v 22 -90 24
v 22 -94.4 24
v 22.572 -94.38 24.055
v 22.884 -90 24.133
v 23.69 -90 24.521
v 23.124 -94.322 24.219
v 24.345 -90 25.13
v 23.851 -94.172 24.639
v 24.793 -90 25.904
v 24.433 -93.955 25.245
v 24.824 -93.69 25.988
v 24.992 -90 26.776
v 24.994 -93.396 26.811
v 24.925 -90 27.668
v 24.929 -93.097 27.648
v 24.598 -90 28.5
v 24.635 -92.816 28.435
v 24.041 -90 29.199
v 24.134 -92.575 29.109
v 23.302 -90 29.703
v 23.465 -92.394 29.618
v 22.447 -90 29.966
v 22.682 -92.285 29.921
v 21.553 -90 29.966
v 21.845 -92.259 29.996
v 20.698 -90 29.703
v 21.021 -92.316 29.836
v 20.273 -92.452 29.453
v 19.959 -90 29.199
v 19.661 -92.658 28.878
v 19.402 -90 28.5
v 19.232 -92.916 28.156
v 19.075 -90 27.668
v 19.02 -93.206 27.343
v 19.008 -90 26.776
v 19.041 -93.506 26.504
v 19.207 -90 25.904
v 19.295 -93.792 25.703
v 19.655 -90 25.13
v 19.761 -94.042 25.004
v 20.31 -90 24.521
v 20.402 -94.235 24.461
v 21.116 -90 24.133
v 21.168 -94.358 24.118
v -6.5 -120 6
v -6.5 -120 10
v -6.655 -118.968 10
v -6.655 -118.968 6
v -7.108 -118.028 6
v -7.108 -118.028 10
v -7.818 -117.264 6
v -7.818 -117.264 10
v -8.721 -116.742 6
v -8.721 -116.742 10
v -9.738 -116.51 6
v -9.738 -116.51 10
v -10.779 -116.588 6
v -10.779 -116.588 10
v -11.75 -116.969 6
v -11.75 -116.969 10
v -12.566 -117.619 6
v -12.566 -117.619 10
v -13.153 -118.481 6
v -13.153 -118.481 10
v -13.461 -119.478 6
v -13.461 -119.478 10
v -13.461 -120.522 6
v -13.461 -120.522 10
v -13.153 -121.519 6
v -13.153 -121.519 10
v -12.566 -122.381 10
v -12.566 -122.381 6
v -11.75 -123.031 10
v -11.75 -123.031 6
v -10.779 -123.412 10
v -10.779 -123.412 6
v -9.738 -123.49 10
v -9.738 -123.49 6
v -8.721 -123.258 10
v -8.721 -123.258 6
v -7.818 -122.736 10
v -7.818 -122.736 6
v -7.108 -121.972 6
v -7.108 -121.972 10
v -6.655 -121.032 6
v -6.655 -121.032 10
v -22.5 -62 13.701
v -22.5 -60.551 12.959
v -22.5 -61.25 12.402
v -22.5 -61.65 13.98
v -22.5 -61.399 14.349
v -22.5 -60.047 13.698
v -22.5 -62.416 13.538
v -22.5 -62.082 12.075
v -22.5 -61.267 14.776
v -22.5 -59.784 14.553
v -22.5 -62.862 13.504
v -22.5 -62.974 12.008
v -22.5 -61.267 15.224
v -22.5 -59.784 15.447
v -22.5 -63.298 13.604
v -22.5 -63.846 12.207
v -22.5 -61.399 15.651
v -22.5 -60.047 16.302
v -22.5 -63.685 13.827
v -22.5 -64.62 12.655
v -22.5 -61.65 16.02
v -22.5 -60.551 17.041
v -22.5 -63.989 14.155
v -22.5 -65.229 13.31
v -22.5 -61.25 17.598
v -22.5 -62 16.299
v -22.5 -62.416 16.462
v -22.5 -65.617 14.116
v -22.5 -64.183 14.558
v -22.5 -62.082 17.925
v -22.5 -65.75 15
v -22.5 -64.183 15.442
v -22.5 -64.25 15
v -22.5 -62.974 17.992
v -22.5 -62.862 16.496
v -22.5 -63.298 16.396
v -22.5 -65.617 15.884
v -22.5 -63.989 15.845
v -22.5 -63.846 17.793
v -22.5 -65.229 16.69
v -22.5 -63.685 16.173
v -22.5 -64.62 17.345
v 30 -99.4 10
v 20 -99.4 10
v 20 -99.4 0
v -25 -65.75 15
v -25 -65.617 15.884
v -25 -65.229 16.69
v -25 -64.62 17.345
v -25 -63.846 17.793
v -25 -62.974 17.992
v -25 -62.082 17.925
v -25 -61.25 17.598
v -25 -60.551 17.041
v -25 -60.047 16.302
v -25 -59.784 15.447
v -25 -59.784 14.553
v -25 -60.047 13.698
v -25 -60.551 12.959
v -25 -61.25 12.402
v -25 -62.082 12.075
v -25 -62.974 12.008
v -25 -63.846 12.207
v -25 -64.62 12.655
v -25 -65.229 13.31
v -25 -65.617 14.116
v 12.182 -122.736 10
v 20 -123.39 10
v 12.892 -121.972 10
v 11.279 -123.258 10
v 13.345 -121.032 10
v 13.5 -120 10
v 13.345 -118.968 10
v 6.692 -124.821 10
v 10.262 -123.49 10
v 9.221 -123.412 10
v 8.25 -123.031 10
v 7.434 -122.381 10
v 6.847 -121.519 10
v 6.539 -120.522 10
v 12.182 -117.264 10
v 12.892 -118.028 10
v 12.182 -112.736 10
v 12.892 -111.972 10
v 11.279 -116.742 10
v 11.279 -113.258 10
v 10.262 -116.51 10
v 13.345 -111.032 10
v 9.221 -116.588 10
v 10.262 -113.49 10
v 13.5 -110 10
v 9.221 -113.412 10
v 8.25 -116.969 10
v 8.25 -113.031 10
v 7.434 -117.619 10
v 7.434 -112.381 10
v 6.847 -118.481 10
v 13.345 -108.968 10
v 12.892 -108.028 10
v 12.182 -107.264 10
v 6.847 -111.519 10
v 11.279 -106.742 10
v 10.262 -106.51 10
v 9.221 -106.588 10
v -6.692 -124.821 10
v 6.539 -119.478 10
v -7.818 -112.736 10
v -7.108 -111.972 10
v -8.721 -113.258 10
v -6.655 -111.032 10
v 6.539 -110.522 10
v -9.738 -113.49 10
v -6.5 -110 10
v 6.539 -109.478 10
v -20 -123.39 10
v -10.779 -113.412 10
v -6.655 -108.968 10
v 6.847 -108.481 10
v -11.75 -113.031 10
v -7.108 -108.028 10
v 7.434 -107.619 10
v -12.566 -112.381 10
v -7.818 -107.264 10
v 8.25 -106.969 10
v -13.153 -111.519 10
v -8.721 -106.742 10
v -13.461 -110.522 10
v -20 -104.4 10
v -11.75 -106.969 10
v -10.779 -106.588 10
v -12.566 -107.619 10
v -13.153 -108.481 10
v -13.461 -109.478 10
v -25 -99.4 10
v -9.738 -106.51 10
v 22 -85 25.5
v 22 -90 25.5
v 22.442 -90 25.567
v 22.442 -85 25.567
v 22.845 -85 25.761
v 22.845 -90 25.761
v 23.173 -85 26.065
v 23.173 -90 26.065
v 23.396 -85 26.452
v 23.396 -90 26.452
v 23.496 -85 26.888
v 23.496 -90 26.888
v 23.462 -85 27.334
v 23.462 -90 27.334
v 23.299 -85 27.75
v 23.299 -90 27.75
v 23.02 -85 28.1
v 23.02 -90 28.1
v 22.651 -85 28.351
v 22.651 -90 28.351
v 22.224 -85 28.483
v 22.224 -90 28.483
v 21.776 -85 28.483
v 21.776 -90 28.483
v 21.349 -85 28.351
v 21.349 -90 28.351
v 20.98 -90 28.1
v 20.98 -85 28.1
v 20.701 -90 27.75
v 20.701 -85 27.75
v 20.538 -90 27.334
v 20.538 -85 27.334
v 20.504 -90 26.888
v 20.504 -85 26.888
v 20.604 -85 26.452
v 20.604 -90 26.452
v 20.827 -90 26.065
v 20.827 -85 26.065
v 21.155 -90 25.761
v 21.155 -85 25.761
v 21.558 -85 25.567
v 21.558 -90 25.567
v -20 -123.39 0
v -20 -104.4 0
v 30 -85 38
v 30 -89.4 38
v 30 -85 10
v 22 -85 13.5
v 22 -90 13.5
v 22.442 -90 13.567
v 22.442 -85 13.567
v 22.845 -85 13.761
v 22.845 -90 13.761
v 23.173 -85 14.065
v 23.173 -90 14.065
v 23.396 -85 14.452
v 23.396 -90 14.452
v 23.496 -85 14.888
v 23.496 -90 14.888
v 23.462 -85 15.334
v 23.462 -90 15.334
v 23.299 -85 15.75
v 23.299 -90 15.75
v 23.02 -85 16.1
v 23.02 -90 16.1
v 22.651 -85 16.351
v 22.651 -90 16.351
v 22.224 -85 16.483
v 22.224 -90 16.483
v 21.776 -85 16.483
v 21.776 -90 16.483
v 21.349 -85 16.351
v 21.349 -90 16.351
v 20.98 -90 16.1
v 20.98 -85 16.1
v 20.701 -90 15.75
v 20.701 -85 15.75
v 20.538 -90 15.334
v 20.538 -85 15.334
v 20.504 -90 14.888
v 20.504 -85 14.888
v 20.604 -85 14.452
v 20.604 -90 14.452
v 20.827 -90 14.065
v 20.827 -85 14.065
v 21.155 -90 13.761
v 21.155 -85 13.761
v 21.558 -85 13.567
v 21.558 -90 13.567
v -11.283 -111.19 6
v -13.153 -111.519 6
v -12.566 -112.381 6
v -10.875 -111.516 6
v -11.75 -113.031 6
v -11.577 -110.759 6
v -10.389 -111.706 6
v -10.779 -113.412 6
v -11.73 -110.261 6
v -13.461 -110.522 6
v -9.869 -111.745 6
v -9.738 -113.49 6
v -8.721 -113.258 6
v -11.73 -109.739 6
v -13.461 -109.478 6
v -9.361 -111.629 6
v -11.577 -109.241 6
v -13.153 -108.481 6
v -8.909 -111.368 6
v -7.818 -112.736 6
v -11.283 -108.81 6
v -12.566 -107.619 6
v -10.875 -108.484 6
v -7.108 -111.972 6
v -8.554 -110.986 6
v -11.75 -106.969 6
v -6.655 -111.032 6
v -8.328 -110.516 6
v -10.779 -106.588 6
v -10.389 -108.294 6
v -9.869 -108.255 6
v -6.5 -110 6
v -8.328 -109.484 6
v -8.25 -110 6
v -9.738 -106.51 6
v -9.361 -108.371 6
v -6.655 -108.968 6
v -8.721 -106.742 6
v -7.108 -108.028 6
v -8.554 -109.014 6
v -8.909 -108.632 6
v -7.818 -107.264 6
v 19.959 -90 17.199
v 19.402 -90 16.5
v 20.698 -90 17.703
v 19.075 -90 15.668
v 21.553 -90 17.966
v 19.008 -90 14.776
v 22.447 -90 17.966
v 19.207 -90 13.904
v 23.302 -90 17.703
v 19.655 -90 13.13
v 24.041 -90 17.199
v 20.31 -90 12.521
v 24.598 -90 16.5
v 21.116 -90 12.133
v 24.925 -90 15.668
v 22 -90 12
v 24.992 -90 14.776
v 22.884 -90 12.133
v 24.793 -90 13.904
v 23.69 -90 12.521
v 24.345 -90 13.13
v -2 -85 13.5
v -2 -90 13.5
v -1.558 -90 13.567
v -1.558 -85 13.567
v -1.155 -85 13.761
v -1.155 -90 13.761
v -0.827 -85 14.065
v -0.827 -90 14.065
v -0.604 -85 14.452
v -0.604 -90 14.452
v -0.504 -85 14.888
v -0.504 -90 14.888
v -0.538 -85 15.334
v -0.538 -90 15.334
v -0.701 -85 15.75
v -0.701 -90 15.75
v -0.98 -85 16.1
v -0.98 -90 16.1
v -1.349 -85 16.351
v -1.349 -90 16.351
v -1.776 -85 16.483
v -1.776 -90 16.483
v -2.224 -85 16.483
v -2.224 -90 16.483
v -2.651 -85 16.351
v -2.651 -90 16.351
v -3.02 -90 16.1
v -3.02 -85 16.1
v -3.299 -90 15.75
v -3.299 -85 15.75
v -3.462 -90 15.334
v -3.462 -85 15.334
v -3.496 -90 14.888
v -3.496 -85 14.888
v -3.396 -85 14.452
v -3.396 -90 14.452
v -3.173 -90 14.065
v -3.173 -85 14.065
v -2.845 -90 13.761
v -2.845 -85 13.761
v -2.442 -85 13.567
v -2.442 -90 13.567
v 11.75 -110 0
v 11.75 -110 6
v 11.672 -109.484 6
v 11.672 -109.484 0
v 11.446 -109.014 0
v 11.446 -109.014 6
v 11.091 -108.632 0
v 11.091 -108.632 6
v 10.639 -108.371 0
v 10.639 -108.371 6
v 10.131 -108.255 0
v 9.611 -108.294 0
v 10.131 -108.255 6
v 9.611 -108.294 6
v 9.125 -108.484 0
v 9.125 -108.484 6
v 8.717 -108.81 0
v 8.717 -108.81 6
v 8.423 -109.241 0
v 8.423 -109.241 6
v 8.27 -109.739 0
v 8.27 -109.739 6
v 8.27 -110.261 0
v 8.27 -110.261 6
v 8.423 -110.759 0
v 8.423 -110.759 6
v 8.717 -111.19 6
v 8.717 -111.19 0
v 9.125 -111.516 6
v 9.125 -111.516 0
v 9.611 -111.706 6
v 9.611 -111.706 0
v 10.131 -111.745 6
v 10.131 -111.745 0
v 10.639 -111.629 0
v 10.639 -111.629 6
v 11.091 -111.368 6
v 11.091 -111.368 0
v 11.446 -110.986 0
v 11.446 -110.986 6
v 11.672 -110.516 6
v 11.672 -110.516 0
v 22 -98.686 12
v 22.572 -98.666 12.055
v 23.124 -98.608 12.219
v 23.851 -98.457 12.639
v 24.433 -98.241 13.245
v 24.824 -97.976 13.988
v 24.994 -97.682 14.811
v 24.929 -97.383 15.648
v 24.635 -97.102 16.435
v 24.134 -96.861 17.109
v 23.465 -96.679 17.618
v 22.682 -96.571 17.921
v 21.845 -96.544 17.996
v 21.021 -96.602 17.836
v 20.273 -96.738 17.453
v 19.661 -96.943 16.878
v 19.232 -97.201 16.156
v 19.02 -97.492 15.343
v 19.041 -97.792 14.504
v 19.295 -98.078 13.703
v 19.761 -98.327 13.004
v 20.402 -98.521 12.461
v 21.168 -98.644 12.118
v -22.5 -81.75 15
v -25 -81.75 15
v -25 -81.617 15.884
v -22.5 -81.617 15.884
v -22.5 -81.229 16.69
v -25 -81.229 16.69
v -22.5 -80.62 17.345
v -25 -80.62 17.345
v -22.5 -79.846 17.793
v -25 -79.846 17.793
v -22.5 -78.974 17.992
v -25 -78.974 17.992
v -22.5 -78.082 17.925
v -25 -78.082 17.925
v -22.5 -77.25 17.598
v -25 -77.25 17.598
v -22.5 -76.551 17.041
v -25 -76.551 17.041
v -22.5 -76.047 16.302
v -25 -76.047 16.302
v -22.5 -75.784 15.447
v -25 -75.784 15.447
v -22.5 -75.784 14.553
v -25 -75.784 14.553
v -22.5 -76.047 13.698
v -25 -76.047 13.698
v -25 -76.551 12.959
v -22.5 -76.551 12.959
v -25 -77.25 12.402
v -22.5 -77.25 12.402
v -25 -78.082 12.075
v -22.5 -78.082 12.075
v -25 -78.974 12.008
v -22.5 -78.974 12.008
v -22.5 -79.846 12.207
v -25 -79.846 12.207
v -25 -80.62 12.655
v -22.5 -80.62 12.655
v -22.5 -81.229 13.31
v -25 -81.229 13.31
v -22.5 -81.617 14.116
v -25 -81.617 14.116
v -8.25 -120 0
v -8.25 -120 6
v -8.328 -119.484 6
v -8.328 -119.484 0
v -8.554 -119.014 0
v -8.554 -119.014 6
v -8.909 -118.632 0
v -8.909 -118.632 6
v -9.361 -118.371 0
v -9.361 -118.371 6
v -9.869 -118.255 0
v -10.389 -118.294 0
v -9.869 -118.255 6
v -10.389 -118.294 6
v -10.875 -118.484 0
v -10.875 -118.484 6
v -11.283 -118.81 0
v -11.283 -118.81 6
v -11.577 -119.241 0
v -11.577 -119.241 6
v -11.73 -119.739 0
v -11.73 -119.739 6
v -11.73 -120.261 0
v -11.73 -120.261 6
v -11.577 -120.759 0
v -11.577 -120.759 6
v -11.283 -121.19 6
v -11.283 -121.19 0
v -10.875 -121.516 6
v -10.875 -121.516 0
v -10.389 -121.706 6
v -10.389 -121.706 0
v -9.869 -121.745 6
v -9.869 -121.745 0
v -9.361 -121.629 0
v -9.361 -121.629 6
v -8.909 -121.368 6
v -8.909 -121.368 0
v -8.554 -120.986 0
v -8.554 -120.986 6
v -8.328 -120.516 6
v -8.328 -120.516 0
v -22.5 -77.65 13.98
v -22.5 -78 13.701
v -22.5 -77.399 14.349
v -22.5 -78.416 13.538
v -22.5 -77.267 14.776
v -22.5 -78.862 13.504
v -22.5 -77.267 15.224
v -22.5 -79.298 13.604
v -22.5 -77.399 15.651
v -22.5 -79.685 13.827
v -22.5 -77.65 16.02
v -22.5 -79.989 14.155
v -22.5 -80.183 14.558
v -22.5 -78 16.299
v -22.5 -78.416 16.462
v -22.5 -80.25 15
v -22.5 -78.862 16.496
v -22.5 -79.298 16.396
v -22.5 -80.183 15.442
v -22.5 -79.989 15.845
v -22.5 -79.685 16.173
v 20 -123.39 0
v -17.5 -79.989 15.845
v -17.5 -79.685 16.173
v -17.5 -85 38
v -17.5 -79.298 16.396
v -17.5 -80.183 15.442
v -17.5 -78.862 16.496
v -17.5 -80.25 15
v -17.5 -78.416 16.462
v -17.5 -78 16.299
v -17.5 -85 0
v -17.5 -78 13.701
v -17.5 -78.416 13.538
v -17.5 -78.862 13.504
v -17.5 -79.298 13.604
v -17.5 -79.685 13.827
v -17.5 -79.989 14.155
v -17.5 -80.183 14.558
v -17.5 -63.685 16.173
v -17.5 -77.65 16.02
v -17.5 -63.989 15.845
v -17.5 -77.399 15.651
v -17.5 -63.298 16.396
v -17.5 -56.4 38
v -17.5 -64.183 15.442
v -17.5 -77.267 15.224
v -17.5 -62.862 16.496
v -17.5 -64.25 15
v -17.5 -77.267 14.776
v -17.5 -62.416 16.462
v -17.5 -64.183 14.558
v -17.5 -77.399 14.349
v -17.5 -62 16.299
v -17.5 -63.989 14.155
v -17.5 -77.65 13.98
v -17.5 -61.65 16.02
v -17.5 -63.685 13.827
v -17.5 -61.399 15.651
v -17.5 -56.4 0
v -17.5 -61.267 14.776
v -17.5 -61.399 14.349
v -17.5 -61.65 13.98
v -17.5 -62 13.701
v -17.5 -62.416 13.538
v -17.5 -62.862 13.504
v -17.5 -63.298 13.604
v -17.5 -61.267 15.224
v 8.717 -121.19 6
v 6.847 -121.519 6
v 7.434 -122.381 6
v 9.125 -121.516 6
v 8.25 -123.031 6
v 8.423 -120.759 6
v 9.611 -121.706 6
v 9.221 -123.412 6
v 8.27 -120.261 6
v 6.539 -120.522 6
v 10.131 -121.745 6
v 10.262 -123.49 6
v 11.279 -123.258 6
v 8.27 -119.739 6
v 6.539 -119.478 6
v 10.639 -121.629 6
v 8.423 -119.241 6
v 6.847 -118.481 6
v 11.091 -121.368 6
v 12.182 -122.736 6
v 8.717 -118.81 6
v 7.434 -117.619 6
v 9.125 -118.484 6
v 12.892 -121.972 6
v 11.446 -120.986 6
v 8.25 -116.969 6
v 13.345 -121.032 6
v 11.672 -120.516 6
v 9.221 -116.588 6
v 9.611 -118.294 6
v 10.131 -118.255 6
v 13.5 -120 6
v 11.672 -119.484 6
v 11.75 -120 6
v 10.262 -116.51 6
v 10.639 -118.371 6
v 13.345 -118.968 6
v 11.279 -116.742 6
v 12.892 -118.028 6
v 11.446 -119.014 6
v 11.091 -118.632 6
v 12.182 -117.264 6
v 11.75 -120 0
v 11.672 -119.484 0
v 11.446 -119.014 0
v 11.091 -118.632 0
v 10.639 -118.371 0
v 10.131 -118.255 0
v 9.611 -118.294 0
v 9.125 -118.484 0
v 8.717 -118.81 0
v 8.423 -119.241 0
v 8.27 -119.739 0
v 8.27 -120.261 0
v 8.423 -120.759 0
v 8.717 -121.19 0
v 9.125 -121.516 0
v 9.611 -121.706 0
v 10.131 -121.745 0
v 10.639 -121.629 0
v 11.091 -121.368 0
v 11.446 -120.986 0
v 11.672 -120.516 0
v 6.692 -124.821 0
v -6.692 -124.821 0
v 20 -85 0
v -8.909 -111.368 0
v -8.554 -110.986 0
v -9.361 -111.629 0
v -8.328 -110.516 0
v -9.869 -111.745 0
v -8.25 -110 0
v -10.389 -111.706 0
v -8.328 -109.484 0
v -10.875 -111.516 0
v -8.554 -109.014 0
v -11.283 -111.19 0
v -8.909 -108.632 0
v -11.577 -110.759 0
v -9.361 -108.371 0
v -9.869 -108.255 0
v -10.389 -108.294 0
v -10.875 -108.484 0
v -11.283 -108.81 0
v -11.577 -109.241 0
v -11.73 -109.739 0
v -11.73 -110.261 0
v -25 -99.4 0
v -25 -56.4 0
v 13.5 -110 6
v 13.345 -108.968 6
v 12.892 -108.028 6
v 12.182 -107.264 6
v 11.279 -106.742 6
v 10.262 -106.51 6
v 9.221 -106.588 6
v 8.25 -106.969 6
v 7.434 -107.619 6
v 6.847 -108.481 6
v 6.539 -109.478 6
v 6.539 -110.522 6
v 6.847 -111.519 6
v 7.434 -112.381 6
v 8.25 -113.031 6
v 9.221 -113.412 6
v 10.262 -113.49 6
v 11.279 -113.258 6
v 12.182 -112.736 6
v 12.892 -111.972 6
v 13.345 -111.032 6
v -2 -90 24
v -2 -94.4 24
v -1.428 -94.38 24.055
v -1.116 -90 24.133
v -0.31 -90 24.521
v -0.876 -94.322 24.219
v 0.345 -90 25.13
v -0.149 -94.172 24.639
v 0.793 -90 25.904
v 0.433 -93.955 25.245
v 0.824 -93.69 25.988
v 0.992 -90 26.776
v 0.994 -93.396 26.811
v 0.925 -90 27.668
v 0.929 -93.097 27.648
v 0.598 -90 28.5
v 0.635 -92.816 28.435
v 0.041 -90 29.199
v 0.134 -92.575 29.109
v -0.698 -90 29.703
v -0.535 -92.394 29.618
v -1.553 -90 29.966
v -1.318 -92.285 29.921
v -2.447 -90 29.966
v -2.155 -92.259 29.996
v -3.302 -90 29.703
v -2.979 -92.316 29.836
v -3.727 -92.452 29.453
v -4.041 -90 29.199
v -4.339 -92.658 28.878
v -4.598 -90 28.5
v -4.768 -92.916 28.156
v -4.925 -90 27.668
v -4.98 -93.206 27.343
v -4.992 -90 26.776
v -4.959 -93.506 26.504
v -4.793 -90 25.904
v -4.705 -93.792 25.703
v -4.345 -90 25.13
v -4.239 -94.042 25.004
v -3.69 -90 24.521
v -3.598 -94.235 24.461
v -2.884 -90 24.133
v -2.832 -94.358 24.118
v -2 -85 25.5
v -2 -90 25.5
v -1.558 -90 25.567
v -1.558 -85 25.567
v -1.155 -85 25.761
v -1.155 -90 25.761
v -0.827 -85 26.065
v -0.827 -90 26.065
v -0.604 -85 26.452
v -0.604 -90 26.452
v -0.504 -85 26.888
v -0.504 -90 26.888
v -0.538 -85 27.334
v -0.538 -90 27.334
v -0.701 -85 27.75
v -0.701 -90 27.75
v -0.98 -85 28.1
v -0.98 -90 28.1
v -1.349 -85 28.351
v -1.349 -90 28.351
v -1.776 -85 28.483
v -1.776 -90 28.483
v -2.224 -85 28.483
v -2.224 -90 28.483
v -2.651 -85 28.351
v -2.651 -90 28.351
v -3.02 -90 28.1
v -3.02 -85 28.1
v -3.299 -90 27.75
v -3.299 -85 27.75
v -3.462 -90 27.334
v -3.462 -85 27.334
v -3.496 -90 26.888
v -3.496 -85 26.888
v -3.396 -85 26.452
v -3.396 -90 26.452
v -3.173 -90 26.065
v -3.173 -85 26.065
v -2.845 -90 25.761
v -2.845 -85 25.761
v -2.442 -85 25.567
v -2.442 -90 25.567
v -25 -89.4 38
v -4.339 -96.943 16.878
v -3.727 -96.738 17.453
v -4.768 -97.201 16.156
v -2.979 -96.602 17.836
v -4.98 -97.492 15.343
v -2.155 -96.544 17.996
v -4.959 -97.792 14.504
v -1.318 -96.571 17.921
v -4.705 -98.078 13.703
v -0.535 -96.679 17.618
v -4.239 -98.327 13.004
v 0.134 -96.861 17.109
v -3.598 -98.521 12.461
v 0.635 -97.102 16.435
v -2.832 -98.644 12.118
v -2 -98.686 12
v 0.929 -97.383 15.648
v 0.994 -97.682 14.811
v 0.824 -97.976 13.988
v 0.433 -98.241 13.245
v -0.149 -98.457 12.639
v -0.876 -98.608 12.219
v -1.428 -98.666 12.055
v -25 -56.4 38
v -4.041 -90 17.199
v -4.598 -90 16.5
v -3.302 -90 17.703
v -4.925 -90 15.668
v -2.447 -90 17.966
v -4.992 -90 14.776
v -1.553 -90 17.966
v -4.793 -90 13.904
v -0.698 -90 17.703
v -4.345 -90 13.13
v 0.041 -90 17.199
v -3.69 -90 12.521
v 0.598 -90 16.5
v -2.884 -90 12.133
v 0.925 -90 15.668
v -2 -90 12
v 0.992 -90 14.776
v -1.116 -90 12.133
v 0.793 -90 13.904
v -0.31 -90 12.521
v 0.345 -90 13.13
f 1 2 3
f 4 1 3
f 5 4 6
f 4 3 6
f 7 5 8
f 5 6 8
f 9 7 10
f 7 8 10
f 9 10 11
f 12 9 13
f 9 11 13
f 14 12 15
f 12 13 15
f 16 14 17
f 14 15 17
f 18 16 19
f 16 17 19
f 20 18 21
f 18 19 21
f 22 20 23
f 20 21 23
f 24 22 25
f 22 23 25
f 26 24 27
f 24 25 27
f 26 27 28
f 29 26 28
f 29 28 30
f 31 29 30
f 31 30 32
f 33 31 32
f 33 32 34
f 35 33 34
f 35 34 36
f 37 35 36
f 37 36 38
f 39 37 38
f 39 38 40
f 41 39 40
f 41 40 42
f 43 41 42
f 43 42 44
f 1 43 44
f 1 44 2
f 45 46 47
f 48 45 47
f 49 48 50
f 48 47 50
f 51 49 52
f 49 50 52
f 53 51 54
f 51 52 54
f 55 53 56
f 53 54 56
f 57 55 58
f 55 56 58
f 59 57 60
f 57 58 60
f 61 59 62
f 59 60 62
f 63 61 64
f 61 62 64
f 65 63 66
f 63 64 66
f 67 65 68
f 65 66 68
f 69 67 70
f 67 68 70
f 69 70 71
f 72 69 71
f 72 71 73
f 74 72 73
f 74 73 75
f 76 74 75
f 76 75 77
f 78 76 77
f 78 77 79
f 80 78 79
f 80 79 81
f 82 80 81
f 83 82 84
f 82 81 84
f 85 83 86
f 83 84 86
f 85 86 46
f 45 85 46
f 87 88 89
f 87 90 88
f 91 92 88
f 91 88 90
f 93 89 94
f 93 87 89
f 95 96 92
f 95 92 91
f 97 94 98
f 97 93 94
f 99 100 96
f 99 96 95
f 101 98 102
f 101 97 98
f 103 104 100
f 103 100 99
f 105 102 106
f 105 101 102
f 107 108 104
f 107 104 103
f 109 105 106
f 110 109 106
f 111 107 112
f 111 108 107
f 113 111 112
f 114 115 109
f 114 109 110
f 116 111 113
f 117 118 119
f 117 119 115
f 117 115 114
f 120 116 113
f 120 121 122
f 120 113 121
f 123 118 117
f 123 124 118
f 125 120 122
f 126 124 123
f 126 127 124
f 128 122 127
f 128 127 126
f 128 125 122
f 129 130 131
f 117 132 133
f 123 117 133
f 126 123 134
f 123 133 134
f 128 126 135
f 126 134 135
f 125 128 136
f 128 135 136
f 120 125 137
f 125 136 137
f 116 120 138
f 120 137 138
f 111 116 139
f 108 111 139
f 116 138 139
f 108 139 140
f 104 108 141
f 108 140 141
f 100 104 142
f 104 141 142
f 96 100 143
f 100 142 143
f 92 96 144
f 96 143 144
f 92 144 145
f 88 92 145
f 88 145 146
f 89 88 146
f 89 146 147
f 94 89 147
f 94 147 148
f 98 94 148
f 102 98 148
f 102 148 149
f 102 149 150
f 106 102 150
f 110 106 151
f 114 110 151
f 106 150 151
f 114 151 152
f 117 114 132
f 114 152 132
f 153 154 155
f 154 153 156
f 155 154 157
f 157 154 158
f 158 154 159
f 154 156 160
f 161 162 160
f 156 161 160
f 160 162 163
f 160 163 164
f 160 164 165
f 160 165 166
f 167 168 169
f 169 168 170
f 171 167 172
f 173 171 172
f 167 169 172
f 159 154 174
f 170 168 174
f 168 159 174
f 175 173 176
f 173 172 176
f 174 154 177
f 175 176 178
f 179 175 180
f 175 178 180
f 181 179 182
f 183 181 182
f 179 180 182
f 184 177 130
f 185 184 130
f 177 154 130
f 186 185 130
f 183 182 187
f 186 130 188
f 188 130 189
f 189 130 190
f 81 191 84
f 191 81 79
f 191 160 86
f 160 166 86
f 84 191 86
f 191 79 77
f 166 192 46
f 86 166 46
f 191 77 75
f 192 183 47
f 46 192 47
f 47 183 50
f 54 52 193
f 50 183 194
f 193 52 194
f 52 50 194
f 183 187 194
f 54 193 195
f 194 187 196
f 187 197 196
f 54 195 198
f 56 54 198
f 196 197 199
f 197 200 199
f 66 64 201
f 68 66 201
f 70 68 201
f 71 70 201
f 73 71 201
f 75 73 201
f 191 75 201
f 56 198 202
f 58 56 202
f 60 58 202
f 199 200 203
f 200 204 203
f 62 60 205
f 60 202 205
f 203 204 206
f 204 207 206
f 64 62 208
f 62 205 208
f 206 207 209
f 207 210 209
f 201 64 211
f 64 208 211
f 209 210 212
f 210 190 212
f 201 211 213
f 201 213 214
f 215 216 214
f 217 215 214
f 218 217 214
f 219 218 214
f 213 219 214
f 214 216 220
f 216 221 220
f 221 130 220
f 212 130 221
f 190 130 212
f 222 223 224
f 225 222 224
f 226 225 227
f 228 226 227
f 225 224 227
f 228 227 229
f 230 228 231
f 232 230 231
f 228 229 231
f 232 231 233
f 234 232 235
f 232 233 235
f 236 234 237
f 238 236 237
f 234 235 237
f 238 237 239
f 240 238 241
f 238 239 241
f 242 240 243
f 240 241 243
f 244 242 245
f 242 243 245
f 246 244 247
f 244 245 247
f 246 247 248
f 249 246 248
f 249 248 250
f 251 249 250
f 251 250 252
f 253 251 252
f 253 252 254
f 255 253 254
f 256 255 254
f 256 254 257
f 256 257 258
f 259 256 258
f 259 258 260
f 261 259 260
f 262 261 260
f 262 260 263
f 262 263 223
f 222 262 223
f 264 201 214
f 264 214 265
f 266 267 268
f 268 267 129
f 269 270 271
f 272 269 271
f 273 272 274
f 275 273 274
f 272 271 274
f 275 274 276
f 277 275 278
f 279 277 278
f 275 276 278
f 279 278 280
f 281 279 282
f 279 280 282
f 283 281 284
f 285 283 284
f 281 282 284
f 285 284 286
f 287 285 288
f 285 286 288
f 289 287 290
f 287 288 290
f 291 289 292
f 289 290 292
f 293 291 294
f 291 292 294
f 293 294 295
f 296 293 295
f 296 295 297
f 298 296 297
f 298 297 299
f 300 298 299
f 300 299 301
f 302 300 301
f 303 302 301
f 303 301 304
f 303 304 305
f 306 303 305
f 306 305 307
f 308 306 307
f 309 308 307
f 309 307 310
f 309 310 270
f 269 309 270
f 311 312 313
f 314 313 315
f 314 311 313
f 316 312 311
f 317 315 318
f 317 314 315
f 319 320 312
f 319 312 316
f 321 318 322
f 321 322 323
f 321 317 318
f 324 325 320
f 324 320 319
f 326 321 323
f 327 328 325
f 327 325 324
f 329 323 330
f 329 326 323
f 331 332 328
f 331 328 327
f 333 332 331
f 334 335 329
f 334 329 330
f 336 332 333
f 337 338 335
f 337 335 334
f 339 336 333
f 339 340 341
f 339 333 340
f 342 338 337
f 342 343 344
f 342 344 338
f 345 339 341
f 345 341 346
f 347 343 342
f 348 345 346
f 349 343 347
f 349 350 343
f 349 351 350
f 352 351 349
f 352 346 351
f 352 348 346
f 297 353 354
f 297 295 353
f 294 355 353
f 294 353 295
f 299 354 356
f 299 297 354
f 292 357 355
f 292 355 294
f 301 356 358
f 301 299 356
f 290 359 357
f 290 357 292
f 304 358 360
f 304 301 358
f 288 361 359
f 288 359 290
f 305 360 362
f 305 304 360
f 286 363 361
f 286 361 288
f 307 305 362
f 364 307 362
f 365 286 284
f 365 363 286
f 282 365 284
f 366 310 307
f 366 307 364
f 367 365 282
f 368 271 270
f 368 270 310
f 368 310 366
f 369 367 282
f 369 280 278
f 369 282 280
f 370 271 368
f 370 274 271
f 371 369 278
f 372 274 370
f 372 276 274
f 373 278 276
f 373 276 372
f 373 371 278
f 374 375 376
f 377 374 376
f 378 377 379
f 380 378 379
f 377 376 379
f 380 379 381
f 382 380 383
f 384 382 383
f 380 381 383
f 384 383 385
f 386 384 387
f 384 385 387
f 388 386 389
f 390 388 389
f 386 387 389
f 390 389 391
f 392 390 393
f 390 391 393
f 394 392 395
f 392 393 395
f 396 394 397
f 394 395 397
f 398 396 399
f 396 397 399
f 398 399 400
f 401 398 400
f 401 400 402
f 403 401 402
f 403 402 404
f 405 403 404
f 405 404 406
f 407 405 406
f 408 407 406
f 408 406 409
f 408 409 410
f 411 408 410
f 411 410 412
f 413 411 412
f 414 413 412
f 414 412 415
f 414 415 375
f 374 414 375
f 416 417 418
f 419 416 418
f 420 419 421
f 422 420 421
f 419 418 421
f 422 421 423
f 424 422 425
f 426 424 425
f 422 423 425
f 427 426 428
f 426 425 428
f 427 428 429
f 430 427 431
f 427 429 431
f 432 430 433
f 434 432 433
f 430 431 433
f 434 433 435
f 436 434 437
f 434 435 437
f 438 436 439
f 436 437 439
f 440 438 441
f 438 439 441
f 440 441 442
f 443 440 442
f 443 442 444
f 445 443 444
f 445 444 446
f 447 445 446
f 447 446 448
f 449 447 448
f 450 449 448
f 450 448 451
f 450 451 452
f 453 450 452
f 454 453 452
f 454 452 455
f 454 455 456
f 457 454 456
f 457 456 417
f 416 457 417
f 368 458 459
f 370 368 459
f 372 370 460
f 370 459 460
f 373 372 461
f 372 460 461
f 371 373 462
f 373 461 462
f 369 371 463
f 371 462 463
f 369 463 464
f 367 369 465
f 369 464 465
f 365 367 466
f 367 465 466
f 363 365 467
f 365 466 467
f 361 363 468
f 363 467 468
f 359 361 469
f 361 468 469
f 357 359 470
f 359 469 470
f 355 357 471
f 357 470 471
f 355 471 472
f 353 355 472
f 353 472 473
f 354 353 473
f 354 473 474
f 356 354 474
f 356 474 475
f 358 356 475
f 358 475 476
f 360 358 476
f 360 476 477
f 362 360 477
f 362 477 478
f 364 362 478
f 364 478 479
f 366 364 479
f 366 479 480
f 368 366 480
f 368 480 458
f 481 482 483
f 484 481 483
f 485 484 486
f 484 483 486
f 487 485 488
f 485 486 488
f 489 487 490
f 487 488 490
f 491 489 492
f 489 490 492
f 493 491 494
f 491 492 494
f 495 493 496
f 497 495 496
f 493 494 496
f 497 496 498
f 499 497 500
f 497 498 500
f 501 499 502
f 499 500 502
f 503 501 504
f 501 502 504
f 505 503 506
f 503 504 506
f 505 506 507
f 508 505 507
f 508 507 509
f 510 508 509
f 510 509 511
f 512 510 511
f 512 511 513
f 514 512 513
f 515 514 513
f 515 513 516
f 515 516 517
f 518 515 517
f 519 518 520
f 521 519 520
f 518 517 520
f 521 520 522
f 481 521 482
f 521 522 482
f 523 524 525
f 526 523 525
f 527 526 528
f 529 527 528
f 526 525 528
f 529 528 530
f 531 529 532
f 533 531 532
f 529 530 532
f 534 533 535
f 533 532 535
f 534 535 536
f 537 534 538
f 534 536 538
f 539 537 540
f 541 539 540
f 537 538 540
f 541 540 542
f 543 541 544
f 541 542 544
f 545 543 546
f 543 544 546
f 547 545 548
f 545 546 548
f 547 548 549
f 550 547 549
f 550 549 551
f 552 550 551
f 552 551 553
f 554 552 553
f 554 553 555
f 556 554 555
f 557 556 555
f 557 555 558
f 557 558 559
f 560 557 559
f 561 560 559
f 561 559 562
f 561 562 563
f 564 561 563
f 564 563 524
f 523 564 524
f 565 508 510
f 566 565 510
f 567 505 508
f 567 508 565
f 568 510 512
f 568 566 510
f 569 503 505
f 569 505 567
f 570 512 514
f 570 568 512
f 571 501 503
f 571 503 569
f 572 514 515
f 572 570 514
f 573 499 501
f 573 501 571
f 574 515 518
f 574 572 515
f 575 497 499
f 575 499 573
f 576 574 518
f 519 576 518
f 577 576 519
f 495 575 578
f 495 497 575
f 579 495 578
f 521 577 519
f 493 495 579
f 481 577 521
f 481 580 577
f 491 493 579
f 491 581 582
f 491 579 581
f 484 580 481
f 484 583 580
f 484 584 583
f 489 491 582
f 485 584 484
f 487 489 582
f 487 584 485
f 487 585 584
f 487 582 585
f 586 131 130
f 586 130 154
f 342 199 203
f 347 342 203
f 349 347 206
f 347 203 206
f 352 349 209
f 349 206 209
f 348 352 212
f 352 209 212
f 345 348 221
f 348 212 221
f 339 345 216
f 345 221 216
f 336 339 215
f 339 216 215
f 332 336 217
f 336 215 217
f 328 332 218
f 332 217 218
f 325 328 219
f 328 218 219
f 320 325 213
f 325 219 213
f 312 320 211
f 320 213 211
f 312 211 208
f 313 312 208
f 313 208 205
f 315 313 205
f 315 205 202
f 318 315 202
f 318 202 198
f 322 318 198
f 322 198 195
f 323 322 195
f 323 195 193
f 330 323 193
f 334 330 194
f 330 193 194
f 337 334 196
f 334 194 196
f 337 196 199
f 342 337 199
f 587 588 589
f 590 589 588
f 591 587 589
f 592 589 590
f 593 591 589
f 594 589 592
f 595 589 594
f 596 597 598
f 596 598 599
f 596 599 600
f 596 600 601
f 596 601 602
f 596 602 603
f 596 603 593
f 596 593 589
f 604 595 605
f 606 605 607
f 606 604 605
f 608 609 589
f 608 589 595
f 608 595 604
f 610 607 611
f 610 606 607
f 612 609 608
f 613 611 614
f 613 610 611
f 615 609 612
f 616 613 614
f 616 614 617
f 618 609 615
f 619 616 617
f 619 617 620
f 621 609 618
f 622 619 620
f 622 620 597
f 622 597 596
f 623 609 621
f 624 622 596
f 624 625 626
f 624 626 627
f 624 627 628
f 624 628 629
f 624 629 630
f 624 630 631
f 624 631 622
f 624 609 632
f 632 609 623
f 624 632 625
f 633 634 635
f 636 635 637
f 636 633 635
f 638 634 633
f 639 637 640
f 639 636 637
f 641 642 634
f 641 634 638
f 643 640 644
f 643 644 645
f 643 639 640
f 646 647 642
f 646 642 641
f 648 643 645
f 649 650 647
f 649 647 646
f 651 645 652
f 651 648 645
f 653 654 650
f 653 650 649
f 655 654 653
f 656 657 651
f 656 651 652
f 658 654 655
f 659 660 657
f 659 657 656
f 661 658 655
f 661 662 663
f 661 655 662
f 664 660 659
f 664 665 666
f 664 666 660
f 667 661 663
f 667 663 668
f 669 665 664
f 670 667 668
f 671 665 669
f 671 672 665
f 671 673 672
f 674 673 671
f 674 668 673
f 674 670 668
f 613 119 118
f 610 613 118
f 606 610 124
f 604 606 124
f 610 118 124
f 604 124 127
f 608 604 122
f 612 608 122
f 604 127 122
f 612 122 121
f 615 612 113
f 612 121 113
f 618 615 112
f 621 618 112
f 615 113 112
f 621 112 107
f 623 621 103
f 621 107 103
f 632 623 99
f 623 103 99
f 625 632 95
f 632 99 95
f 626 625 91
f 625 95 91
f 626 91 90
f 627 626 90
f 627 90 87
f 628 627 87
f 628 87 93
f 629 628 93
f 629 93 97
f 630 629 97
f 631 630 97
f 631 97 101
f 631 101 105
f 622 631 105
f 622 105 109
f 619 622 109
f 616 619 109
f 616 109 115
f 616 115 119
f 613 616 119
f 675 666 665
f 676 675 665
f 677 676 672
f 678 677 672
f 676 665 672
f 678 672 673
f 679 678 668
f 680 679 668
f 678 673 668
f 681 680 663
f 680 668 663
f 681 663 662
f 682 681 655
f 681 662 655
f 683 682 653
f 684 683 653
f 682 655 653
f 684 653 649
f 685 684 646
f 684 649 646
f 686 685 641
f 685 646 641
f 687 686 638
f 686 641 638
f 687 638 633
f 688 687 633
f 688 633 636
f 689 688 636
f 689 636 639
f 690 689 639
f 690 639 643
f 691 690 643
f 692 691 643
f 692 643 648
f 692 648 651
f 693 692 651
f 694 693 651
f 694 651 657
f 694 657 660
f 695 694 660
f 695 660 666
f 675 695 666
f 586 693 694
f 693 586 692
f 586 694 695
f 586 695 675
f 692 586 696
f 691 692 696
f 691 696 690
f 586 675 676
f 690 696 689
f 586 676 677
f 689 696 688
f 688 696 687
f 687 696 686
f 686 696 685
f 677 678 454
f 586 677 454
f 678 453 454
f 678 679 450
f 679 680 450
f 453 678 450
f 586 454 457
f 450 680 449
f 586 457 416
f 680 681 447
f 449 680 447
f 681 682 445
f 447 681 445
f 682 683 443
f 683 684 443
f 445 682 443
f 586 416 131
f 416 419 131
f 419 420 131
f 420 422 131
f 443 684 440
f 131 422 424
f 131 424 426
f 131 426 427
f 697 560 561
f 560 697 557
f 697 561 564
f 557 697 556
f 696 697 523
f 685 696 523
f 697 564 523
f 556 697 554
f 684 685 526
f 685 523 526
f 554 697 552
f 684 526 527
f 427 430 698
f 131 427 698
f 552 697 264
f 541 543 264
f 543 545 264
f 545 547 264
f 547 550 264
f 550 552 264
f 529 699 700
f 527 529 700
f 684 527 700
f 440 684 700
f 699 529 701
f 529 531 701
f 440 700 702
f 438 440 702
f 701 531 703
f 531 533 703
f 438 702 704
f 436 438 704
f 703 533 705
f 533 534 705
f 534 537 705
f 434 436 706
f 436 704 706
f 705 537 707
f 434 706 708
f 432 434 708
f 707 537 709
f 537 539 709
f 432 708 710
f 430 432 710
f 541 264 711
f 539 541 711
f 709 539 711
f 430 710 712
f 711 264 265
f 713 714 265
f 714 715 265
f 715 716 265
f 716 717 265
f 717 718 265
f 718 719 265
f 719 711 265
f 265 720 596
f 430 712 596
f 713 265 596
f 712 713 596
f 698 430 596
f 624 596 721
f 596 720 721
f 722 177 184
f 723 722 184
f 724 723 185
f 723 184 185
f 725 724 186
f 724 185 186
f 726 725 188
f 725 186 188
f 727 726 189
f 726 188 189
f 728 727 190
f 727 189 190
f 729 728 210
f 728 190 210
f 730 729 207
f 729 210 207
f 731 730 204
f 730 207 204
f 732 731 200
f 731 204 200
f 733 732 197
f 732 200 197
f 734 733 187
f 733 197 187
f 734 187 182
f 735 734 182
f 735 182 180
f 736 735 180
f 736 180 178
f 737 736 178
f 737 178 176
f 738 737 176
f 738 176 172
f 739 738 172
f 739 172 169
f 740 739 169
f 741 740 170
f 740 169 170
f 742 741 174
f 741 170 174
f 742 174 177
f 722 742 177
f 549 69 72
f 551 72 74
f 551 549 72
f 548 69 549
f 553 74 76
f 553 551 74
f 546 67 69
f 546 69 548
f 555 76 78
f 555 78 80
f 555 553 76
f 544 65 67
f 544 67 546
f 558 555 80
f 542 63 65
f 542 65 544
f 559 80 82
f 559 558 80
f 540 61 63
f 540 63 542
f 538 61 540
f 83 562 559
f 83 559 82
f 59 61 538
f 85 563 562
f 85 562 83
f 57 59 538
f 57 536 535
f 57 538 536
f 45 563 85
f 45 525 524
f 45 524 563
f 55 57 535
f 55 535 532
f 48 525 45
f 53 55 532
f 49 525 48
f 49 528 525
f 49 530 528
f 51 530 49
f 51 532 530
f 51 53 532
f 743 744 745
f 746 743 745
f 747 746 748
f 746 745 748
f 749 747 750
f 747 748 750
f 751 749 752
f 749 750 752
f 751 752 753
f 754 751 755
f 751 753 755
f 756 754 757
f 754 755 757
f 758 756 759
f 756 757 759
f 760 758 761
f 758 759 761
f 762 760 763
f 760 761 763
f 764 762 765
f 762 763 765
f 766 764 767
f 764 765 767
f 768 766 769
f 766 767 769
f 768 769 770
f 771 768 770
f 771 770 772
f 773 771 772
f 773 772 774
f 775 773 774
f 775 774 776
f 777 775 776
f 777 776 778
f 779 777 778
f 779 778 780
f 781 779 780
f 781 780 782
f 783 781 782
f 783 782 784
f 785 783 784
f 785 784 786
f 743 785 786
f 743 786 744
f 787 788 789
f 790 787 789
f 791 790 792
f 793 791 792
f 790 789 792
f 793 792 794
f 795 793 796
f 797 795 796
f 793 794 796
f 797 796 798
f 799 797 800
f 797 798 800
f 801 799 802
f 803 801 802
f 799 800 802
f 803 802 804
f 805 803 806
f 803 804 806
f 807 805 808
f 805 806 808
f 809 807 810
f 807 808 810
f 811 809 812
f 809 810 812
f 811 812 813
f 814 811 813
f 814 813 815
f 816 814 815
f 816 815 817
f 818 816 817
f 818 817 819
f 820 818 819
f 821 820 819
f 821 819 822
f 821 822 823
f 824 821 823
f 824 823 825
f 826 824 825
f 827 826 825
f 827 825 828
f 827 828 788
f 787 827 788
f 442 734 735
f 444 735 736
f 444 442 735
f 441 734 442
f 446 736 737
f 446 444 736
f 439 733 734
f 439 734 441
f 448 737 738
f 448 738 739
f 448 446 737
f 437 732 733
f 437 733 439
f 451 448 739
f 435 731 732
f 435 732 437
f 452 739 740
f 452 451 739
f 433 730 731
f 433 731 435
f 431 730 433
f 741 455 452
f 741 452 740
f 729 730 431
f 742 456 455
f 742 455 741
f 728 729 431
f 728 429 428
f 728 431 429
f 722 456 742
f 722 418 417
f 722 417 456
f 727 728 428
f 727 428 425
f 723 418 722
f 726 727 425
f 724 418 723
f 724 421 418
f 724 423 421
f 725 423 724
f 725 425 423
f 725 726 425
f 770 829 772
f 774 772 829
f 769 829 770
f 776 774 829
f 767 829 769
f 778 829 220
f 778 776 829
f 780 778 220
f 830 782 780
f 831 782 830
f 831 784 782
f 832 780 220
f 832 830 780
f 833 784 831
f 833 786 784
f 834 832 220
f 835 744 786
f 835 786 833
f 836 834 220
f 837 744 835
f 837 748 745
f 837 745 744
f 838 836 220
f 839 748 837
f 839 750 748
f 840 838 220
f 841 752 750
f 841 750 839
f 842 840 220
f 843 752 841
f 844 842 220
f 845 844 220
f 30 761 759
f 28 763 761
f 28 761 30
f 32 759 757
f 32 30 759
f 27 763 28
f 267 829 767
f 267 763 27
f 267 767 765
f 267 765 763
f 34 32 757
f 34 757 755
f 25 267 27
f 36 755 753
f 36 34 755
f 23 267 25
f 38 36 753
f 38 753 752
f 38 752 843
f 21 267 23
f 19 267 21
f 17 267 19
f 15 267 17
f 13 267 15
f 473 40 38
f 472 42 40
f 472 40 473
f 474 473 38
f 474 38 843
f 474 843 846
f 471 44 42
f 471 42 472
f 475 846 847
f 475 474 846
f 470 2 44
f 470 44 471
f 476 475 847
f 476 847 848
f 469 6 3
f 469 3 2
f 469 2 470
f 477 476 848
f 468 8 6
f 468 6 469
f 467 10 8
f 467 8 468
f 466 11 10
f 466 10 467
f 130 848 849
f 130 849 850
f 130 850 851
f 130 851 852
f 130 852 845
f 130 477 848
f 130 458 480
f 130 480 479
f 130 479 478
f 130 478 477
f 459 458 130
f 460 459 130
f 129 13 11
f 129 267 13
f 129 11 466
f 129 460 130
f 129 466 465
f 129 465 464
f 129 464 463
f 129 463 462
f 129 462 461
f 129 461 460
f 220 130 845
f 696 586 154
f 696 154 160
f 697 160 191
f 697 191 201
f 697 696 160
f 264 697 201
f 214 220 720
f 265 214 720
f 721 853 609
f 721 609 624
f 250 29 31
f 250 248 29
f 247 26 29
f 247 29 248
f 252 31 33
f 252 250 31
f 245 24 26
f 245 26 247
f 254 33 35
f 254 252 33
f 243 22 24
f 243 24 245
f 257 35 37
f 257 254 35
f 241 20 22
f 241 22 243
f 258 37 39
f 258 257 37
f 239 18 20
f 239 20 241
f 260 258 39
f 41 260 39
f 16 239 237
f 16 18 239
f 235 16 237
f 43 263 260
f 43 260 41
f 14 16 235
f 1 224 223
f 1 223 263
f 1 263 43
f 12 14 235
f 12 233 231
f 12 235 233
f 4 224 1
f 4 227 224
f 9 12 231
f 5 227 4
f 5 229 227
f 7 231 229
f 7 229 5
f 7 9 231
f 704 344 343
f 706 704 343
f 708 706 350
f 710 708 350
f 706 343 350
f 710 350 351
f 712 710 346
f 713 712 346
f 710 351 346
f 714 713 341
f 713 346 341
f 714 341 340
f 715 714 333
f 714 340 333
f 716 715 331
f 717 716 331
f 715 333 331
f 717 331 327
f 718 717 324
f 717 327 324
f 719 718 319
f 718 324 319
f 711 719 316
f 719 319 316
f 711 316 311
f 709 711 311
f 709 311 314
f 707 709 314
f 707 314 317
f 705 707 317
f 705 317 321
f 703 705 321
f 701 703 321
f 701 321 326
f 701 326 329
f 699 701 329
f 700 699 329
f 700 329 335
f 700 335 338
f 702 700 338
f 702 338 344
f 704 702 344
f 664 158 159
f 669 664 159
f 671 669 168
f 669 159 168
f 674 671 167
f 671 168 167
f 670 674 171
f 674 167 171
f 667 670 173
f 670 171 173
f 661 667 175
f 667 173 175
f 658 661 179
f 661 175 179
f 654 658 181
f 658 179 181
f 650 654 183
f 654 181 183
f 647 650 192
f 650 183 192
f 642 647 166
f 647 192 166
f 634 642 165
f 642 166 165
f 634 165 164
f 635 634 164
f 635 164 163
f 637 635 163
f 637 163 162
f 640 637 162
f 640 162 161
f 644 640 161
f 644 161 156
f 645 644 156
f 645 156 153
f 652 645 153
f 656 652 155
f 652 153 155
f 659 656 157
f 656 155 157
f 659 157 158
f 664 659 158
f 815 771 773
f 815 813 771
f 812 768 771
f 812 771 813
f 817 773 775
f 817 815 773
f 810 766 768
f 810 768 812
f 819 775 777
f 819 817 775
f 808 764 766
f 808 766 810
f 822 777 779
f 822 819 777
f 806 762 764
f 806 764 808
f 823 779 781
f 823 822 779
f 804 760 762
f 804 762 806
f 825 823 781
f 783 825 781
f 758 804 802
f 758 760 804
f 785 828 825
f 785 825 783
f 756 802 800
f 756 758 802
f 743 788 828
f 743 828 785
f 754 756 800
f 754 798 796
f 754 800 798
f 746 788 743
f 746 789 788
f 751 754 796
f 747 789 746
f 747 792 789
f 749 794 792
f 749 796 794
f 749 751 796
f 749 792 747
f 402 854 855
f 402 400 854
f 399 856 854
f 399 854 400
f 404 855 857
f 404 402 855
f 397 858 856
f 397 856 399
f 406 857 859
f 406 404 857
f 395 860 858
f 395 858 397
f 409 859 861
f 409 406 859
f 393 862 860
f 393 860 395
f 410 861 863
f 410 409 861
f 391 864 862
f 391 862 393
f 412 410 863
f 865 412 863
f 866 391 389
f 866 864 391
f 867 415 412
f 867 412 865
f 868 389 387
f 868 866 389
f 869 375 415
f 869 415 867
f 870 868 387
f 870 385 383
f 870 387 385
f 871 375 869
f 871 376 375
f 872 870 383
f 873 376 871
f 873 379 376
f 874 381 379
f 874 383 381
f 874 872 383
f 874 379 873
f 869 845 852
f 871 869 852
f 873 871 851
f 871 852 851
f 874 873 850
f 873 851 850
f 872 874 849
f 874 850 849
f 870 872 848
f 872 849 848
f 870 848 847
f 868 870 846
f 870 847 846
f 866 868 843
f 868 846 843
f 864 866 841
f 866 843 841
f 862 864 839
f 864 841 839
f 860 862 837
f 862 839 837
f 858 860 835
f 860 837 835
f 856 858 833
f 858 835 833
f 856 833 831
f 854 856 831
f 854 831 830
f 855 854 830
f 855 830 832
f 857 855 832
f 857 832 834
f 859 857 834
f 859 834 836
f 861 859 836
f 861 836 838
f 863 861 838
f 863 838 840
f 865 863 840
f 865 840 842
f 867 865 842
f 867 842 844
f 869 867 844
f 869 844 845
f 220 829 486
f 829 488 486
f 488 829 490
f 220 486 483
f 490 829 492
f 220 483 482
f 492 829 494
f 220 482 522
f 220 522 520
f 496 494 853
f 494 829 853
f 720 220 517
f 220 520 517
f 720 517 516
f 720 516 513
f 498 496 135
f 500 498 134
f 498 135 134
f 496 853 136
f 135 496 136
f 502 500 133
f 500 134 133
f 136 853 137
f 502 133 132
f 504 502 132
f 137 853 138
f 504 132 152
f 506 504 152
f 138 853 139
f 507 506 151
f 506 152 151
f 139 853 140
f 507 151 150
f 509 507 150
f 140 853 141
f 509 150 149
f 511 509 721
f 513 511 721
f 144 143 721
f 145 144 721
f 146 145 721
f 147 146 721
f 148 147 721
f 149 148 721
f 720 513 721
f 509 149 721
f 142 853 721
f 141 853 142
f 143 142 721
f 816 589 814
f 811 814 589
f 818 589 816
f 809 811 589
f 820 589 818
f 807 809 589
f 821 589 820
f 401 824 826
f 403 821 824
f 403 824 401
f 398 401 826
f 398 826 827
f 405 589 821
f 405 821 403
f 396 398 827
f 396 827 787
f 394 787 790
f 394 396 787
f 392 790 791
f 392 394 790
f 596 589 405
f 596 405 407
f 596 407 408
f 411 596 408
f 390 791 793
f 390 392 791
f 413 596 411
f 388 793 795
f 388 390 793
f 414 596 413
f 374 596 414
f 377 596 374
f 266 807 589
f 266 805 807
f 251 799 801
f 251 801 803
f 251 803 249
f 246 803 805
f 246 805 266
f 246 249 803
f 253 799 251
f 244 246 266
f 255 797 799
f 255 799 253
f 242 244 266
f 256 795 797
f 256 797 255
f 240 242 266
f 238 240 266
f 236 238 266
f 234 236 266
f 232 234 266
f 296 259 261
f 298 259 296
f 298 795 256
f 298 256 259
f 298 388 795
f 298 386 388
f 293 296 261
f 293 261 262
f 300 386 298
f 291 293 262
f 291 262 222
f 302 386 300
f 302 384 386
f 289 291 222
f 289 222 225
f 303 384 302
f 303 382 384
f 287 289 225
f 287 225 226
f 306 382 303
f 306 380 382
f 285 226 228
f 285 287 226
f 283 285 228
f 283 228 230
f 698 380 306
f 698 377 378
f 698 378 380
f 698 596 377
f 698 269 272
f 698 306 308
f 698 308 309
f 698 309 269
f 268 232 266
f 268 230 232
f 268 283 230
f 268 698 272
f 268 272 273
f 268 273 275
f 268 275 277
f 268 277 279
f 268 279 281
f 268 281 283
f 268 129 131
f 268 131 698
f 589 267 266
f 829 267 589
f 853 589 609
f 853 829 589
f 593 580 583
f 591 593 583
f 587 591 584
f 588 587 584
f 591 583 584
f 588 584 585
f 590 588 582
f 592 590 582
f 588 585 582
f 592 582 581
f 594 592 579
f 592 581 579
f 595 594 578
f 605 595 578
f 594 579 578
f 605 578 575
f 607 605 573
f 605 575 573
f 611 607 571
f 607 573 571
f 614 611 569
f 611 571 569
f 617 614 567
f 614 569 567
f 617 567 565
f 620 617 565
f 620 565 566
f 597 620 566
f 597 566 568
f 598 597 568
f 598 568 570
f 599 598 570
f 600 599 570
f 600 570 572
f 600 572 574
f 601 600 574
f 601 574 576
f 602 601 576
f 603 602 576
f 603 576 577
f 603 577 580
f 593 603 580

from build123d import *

# Parameters (mm, degrees)
BOSS_EXTRU_1_DEPTH      = 10
ENL_V_MAT_EXTRU_1_REACH = 128.984
ESQUISSE2_R             = 1.75
ESQUISSE4_R             = 3.5
ENL_V_MAT_EXTRU_2_DEPTH = 4
ESQUISSE5_W             = 50
ESQUISSE5_H             = 38
BOSS_EXTRU_2_DEPTH      = 14.4
ENL_V_MAT_EXTRU_3_REACH = 56.766
ESQUISSE6_R             = 1.5
ESQUISSE7_R             = 3
ENL_V_MAT_EXTRU_4_DEPTH = 9.4
CHANFREIN1_SIZE         = 10
CHANFREIN2_SIZE         = 28
CHANFREIN2_SIZE_2       = 10
BOSS_EXTRU_3_DEPTH      = 5
ESQUISSE9_W             = 38
ESQUISSE9_H             = 28.6
BOSS_EXTRU_4_DEPTH      = 2.5
CHANFREIN3_SIZE         = 5
ENL_V_MAT_EXTRU_5_REACH = 143.753
ESQUISSE10_R            = 1.5
ESQUISSE11_R            = 3
ENL_V_MAT_EXTRU_6_DEPTH = 2.5


# Some blends are built 0.0001 mm under size
with BuildPart() as part:
    # Esquisse1 → Boss.-Extru.1 (new body)
    with BuildSketch(Plane.XY):
        with BuildLine():
            Line((-20, -123.389626793), (-20, -99.4))
            Line((-20, -99.4), (20, -99.4))
            Line((20, -99.4), (20, -123.389626793))
            ThreePointArc((20, -123.389626793), (0, -125), (-20, -123.389626793))
        make_face()
    extrude(amount=BOSS_EXTRU_1_DEPTH)

    # Esquisse2 → Enlèv. mat.-Extru.1 (cut, up to next)
    with BuildSketch(Plane.XY.offset(10), mode=Mode.PRIVATE) as enl_v_mat_extru_1_sk1:
        with Locations((-10, -110)):
            Circle(ESQUISSE2_R)
    enl_v_mat_extru_1_tool1 = extrude(enl_v_mat_extru_1_sk1.sketch, amount=-ENL_V_MAT_EXTRU_1_REACH, mode=Mode.PRIVATE) & part.part
    # Esquisse2 → Enlèv. mat.-Extru.1 (cut, up to next)
    with BuildSketch(Plane.XY.offset(10), mode=Mode.PRIVATE) as enl_v_mat_extru_1_sk2:
        with Locations((-10, -120)):
            Circle(ESQUISSE2_R)
    enl_v_mat_extru_1_tool2 = extrude(enl_v_mat_extru_1_sk2.sketch, amount=-ENL_V_MAT_EXTRU_1_REACH, mode=Mode.PRIVATE) & part.part
    # Esquisse2 → Enlèv. mat.-Extru.1 (cut, up to next)
    with BuildSketch(Plane.XY.offset(10), mode=Mode.PRIVATE) as enl_v_mat_extru_1_sk3:
        with Locations((10, -110)):
            Circle(ESQUISSE2_R)
    enl_v_mat_extru_1_tool3 = extrude(enl_v_mat_extru_1_sk3.sketch, amount=-ENL_V_MAT_EXTRU_1_REACH, mode=Mode.PRIVATE) & part.part
    # Esquisse2 → Enlèv. mat.-Extru.1 (cut, up to next)
    with BuildSketch(Plane.XY.offset(10), mode=Mode.PRIVATE) as enl_v_mat_extru_1_sk4:
        with Locations((10, -120)):
            Circle(ESQUISSE2_R)
    enl_v_mat_extru_1_tool4 = extrude(enl_v_mat_extru_1_sk4.sketch, amount=-ENL_V_MAT_EXTRU_1_REACH, mode=Mode.PRIVATE) & part.part
    add(enl_v_mat_extru_1_tool1.solids().sort_by_distance((-10, -110, 10))[0], mode=Mode.SUBTRACT)
    add(enl_v_mat_extru_1_tool2.solids().sort_by_distance((-10, -120, 10))[0], mode=Mode.SUBTRACT)
    add(enl_v_mat_extru_1_tool3.solids().sort_by_distance((10, -110, 10))[0], mode=Mode.SUBTRACT)
    add(enl_v_mat_extru_1_tool4.solids().sort_by_distance((10, -120, 10))[0], mode=Mode.SUBTRACT)

    # Esquisse4 → Enlèv. mat.-Extru.2 (cut)
    with BuildSketch(Plane.XY.offset(10)):
        with Locations((-10, -110)):
            Circle(ESQUISSE4_R)
        with Locations((10, -110)):
            Circle(ESQUISSE4_R)
        with Locations((10, -120)):
            Circle(ESQUISSE4_R)
        with Locations((-10, -120)):
            Circle(ESQUISSE4_R)
    extrude(amount=-ENL_V_MAT_EXTRU_2_DEPTH, mode=Mode.SUBTRACT)

    # Esquisse5 → Boss.-Extru.2 (add)
    with BuildSketch(Plane(origin=(0, -99.4, 0), x_dir=(1, 0, 0), z_dir=(0, 1, 0))):
        with Locations((5, -19)):
            Rectangle(ESQUISSE5_W, ESQUISSE5_H)
    extrude(amount=BOSS_EXTRU_2_DEPTH)

    # Esquisse6 → Enlèv. mat.-Extru.3 (cut, up to next)
    with BuildSketch(Plane.XZ.offset(99.4), mode=Mode.PRIVATE) as enl_v_mat_extru_3_sk1:
        with Locations(Location((-2, 27, 0), (0, 0, 270))):
            Circle(ESQUISSE6_R)
    enl_v_mat_extru_3_tool1 = extrude(enl_v_mat_extru_3_sk1.sketch, amount=-ENL_V_MAT_EXTRU_3_REACH, mode=Mode.PRIVATE) & part.part
    # Esquisse6 → Enlèv. mat.-Extru.3 (cut, up to next)
    with BuildSketch(Plane.XZ.offset(99.4), mode=Mode.PRIVATE) as enl_v_mat_extru_3_sk2:
        with Locations(Location((22, 27, 0), (0, 0, 270))):
            Circle(ESQUISSE6_R)
    enl_v_mat_extru_3_tool2 = extrude(enl_v_mat_extru_3_sk2.sketch, amount=-ENL_V_MAT_EXTRU_3_REACH, mode=Mode.PRIVATE) & part.part
    # Esquisse6 → Enlèv. mat.-Extru.3 (cut, up to next)
    with BuildSketch(Plane.XZ.offset(99.4), mode=Mode.PRIVATE) as enl_v_mat_extru_3_sk3:
        with Locations(Location((-2, 15, 0), (0, 0, 270))):
            Circle(ESQUISSE6_R)
    enl_v_mat_extru_3_tool3 = extrude(enl_v_mat_extru_3_sk3.sketch, amount=-ENL_V_MAT_EXTRU_3_REACH, mode=Mode.PRIVATE) & part.part
    # Esquisse6 → Enlèv. mat.-Extru.3 (cut, up to next)
    with BuildSketch(Plane.XZ.offset(99.4), mode=Mode.PRIVATE) as enl_v_mat_extru_3_sk4:
        with Locations(Location((22, 15, 0), (0, 0, 270))):
            Circle(ESQUISSE6_R)
    enl_v_mat_extru_3_tool4 = extrude(enl_v_mat_extru_3_sk4.sketch, amount=-ENL_V_MAT_EXTRU_3_REACH, mode=Mode.PRIVATE) & part.part
    add(enl_v_mat_extru_3_tool1.solids().sort_by_distance((-2, -99.4, 27))[0], mode=Mode.SUBTRACT)
    add(enl_v_mat_extru_3_tool2.solids().sort_by_distance((22, -99.4, 27))[0], mode=Mode.SUBTRACT)
    add(enl_v_mat_extru_3_tool3.solids().sort_by_distance((-2, -99.4, 15))[0], mode=Mode.SUBTRACT)
    add(enl_v_mat_extru_3_tool4.solids().sort_by_distance((22, -99.4, 15))[0], mode=Mode.SUBTRACT)

    # Esquisse7 → Enlèv. mat.-Extru.4 (cut)
    with BuildSketch(Plane.XZ.offset(99.4)):
        with Locations(Location((-2, 27, 0), (0, 0, 270))):
            Circle(ESQUISSE7_R)
        with Locations(Location((22, 27, 0), (0, 0, 270))):
            Circle(ESQUISSE7_R)
        with Locations(Location((22, 15, 0), (0, 0, 270))):
            Circle(ESQUISSE7_R)
        with Locations(Location((-2, 15, 0), (0, 0, 270))):
            Circle(ESQUISSE7_R)
    extrude(amount=-ENL_V_MAT_EXTRU_4_DEPTH, mode=Mode.SUBTRACT)

    # Chanfrein1
    chanfrein1_edges = [part.edges().sort_by_distance(p)[0] for p in [
        (30, -92.2, 0),
    ]]
    chamfer(chanfrein1_edges, length=CHANFREIN1_SIZE)

    # Chanfrein2
    # the kernel refuses this chamfer: 28, 10 mm, written as the material it takes off along each edge
    with BuildSketch(Plane(origin=(102.642981969, -99.4, 38), x_dir=(0, -0.01296397650632004, -0.9999159641255577), z_dir=(-1, 0, 0))) as chanfrein2_piece_1:
        Polygon((CHANFREIN2_SIZE * 0.999915964126, -CHANFREIN2_SIZE * 0.0129639765063), (-CHANFREIN2_SIZE_2 * 0.0129639765063, -CHANFREIN2_SIZE_2 * 0.999915964126), (0, 0), align=None)
    extrude(amount=195.285963938, mode=Mode.SUBTRACT)

    # Esquisse8 → Boss.-Extru.3 (add)
    with BuildSketch(Plane.ZY.offset(20)):
        Polygon((10, -99.4), (0, -99.4), (0, -56.4), (38, -56.4), (38, -89.4), align=None)
    extrude(amount=BOSS_EXTRU_3_DEPTH)

    # Esquisse9 → Boss.-Extru.4 (add)
    with BuildSketch(Plane(origin=(-20, 0, 0), x_dir=(0, 0, -1), z_dir=(1, 0, 0))):
        with Locations((-19, -70.7)):
            Rectangle(ESQUISSE9_W, ESQUISSE9_H)
    extrude(amount=BOSS_EXTRU_4_DEPTH)

    # Chanfrein3
    chanfrein3_edges = [part.edges().sort_by_distance(p)[0] for p in [
        (-20, -99.4, 5),
    ]]
    chamfer(chanfrein3_edges, length=CHANFREIN3_SIZE - 0.0001)  # a hair under: the kernel refuses the full size

    # Esquisse10 → Enlèv. mat.-Extru.5 (cut, up to next)
    with BuildSketch(Plane.ZY.offset(25), mode=Mode.PRIVATE) as enl_v_mat_extru_5_sk1:
        with Locations(Location((15, -62.75, 0), (0, 0, 270))):
            Circle(ESQUISSE10_R)
    enl_v_mat_extru_5_tool1 = extrude(enl_v_mat_extru_5_sk1.sketch, amount=-ENL_V_MAT_EXTRU_5_REACH, mode=Mode.PRIVATE) & part.part
    # Esquisse10 → Enlèv. mat.-Extru.5 (cut, up to next)
    with BuildSketch(Plane.ZY.offset(25), mode=Mode.PRIVATE) as enl_v_mat_extru_5_sk2:
        with Locations(Location((15, -78.75, 0), (0, 0, 270))):
            Circle(ESQUISSE10_R)
    enl_v_mat_extru_5_tool2 = extrude(enl_v_mat_extru_5_sk2.sketch, amount=-ENL_V_MAT_EXTRU_5_REACH, mode=Mode.PRIVATE) & part.part
    add(enl_v_mat_extru_5_tool1.solids().sort_by_distance((-25, -62.75, 15))[0], mode=Mode.SUBTRACT)
    add(enl_v_mat_extru_5_tool2.solids().sort_by_distance((-25, -78.75, 15))[0], mode=Mode.SUBTRACT)

    # Esquisse11 → Enlèv. mat.-Extru.6 (cut)
    with BuildSketch(Plane.ZY.offset(25)):
        with Locations(Location((15, -62.75, 0), (0, 0, 270))):
            Circle(ESQUISSE11_R)
        with Locations(Location((15, -78.75, 0), (0, 0, 270))):
            Circle(ESQUISSE11_R)
    extrude(amount=-ENL_V_MAT_EXTRU_6_DEPTH, mode=Mode.SUBTRACT)


solid = part.part
